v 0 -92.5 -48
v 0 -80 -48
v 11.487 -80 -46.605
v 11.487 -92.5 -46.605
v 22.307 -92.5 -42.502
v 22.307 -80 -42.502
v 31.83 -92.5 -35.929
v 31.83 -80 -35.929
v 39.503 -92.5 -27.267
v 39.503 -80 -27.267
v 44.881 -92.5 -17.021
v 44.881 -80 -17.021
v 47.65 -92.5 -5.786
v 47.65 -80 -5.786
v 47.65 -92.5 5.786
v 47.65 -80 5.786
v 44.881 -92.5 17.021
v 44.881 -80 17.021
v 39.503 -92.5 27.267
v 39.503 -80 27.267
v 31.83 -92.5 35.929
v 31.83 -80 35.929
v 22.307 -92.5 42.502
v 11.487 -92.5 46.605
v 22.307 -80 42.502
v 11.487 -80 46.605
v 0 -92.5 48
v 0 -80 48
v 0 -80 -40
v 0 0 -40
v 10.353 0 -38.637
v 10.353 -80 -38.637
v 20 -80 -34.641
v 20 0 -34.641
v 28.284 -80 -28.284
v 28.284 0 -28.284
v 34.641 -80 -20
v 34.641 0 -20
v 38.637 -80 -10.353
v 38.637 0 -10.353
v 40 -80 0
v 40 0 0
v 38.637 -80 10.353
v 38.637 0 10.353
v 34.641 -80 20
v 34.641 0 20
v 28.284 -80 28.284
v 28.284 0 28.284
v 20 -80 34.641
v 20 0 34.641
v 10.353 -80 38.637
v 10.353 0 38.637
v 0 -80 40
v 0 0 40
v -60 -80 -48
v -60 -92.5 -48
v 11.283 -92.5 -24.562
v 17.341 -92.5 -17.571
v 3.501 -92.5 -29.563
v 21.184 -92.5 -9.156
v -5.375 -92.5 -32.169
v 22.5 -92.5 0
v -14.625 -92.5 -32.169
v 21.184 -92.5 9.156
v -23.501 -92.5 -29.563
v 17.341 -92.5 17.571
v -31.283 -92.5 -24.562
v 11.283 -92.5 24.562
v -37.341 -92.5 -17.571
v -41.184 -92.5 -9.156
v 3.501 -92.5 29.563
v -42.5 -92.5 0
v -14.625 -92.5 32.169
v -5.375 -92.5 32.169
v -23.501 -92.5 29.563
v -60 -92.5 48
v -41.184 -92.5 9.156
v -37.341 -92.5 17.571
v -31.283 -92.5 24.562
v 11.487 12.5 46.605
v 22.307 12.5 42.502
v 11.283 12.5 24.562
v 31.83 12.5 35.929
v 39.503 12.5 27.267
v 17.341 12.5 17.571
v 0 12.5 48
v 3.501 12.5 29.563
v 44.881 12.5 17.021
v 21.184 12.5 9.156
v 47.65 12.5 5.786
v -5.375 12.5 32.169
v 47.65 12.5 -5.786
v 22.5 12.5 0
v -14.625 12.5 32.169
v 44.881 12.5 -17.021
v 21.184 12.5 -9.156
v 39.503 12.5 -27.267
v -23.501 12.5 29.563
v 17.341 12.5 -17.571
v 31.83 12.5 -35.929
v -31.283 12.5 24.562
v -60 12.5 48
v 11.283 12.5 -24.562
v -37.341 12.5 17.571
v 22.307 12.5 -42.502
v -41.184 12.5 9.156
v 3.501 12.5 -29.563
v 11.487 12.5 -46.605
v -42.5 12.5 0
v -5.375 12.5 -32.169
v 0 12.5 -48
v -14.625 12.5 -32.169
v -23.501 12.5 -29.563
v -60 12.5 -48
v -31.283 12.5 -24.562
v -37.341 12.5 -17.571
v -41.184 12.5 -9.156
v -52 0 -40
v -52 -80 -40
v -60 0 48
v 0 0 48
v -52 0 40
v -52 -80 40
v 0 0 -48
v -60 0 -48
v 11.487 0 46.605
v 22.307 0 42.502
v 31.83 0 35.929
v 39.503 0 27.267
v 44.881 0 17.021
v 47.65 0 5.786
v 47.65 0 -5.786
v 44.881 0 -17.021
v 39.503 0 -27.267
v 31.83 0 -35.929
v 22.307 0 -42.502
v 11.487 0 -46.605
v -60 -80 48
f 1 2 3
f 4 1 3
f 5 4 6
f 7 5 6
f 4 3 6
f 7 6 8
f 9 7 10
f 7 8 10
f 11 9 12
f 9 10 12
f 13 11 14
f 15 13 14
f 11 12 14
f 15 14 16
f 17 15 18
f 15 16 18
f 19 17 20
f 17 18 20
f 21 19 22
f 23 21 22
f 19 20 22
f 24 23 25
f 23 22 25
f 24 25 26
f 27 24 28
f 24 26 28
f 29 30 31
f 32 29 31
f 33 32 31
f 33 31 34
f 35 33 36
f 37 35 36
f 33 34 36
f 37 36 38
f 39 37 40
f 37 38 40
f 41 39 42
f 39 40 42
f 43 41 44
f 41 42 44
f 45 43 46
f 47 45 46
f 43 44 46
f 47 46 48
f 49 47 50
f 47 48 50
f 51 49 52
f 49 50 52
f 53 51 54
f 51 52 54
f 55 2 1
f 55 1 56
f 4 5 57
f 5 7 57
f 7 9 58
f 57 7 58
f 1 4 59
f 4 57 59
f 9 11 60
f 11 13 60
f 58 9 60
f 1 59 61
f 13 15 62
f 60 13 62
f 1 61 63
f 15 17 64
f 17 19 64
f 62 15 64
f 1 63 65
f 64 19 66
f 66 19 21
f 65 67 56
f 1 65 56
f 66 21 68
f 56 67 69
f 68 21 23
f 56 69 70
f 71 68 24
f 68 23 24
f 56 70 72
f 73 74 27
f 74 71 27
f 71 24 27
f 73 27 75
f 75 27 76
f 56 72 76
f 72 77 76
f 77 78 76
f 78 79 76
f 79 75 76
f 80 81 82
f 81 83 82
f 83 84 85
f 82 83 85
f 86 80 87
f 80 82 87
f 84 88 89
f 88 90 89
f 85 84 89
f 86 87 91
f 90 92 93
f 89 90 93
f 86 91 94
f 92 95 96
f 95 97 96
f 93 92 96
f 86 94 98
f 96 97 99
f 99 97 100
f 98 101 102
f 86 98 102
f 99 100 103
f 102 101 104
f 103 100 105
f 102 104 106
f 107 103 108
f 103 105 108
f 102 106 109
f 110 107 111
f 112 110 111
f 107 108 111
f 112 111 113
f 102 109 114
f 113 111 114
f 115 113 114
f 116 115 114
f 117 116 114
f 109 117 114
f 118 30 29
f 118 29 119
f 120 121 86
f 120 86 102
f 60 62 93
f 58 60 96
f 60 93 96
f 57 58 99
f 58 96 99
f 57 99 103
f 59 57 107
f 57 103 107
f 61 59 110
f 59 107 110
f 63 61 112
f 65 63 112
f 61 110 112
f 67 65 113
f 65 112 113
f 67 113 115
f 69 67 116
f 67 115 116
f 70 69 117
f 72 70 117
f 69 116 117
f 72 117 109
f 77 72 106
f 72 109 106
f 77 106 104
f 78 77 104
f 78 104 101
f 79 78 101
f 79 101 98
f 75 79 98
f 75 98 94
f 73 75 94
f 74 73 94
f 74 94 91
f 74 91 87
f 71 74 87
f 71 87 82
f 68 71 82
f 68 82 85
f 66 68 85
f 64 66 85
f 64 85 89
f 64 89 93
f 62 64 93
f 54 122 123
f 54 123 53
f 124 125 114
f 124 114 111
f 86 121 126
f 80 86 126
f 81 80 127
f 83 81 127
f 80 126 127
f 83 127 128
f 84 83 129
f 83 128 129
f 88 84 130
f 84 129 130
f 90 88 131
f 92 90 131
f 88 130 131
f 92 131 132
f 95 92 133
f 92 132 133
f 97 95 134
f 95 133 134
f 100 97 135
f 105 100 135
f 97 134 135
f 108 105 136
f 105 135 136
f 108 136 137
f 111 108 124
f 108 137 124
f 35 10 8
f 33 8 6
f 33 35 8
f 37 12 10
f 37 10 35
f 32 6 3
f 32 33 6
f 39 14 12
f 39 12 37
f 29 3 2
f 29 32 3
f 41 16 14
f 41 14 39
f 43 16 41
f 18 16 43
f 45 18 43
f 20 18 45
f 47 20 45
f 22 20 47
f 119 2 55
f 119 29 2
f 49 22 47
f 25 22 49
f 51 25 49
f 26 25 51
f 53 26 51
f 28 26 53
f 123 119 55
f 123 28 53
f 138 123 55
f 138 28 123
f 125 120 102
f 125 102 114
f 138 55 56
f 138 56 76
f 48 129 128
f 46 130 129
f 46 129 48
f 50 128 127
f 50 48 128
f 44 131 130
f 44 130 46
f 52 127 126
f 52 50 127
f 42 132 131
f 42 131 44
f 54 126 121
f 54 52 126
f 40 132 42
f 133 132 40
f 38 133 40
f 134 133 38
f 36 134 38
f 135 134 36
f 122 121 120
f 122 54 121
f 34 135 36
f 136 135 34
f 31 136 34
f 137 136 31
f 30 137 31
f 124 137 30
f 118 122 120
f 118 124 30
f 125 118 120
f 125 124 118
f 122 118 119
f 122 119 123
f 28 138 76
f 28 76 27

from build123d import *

# Parameters (mm, degrees)
PAD_DEPTH    = 80
PAD001_DEPTH = 12.5
PAD002_DEPTH = 12.5
SKETCH003_R  = 32.5
POCKET_DEPTH = 105.001


with BuildPart() as part:
    # Sketch → Pad (new body)
    with BuildSketch(Plane.XZ):
        with BuildLine():
            ThreePointArc((0, -40), (40, 3e-05), (-6.1e-05, 40))
            Line((-52, 40), (-6.1e-05, 40))
            Line((-52, -40), (-52, 40))
            Line((0, -40), (-52, -40))
        make_face()
    extrude(amount=PAD_DEPTH)

    # Sketch001 → Pad001 (new body)
    with BuildSketch(Plane.XZ.offset(80)):
        with BuildLine():
            Line((-60, 48), (-5.9e-05, 48))
            ThreePointArc((-5.9e-05, -48), (48, 0), (-5.9e-05, 48))
            Line((-5.9e-05, -48), (-60, -48))
            Line((-60, -48), (-60, 48))
        make_face()
    extrude(amount=PAD001_DEPTH)

    # Sketch002 → Pad002 (new body)
    with BuildSketch(Plane(origin=(0, 0, 0), x_dir=(1, 0, 0), z_dir=(0, 1, 0))):
        with BuildLine():
            Line((-60, 48), (-5.9e-05, 48))
            ThreePointArc((-5.9e-05, -48), (48, 0), (-5.9e-05, 48))
            Line((-5.9e-05, -48), (-60, -48))
            Line((-60, -48), (-60, 48))
        make_face()
    extrude(amount=PAD002_DEPTH)

    # Sketch003 → Pocket (cut, through all)
    with BuildSketch(Plane(origin=(0, 12.5, 0), x_dir=(1, 0, 0), z_dir=(0, 1, 0))):
        with Locations((-10, 0)):
            Circle(SKETCH003_R)
    extrude(amount=-POCKET_DEPTH, mode=Mode.SUBTRACT)


solid = part.part
